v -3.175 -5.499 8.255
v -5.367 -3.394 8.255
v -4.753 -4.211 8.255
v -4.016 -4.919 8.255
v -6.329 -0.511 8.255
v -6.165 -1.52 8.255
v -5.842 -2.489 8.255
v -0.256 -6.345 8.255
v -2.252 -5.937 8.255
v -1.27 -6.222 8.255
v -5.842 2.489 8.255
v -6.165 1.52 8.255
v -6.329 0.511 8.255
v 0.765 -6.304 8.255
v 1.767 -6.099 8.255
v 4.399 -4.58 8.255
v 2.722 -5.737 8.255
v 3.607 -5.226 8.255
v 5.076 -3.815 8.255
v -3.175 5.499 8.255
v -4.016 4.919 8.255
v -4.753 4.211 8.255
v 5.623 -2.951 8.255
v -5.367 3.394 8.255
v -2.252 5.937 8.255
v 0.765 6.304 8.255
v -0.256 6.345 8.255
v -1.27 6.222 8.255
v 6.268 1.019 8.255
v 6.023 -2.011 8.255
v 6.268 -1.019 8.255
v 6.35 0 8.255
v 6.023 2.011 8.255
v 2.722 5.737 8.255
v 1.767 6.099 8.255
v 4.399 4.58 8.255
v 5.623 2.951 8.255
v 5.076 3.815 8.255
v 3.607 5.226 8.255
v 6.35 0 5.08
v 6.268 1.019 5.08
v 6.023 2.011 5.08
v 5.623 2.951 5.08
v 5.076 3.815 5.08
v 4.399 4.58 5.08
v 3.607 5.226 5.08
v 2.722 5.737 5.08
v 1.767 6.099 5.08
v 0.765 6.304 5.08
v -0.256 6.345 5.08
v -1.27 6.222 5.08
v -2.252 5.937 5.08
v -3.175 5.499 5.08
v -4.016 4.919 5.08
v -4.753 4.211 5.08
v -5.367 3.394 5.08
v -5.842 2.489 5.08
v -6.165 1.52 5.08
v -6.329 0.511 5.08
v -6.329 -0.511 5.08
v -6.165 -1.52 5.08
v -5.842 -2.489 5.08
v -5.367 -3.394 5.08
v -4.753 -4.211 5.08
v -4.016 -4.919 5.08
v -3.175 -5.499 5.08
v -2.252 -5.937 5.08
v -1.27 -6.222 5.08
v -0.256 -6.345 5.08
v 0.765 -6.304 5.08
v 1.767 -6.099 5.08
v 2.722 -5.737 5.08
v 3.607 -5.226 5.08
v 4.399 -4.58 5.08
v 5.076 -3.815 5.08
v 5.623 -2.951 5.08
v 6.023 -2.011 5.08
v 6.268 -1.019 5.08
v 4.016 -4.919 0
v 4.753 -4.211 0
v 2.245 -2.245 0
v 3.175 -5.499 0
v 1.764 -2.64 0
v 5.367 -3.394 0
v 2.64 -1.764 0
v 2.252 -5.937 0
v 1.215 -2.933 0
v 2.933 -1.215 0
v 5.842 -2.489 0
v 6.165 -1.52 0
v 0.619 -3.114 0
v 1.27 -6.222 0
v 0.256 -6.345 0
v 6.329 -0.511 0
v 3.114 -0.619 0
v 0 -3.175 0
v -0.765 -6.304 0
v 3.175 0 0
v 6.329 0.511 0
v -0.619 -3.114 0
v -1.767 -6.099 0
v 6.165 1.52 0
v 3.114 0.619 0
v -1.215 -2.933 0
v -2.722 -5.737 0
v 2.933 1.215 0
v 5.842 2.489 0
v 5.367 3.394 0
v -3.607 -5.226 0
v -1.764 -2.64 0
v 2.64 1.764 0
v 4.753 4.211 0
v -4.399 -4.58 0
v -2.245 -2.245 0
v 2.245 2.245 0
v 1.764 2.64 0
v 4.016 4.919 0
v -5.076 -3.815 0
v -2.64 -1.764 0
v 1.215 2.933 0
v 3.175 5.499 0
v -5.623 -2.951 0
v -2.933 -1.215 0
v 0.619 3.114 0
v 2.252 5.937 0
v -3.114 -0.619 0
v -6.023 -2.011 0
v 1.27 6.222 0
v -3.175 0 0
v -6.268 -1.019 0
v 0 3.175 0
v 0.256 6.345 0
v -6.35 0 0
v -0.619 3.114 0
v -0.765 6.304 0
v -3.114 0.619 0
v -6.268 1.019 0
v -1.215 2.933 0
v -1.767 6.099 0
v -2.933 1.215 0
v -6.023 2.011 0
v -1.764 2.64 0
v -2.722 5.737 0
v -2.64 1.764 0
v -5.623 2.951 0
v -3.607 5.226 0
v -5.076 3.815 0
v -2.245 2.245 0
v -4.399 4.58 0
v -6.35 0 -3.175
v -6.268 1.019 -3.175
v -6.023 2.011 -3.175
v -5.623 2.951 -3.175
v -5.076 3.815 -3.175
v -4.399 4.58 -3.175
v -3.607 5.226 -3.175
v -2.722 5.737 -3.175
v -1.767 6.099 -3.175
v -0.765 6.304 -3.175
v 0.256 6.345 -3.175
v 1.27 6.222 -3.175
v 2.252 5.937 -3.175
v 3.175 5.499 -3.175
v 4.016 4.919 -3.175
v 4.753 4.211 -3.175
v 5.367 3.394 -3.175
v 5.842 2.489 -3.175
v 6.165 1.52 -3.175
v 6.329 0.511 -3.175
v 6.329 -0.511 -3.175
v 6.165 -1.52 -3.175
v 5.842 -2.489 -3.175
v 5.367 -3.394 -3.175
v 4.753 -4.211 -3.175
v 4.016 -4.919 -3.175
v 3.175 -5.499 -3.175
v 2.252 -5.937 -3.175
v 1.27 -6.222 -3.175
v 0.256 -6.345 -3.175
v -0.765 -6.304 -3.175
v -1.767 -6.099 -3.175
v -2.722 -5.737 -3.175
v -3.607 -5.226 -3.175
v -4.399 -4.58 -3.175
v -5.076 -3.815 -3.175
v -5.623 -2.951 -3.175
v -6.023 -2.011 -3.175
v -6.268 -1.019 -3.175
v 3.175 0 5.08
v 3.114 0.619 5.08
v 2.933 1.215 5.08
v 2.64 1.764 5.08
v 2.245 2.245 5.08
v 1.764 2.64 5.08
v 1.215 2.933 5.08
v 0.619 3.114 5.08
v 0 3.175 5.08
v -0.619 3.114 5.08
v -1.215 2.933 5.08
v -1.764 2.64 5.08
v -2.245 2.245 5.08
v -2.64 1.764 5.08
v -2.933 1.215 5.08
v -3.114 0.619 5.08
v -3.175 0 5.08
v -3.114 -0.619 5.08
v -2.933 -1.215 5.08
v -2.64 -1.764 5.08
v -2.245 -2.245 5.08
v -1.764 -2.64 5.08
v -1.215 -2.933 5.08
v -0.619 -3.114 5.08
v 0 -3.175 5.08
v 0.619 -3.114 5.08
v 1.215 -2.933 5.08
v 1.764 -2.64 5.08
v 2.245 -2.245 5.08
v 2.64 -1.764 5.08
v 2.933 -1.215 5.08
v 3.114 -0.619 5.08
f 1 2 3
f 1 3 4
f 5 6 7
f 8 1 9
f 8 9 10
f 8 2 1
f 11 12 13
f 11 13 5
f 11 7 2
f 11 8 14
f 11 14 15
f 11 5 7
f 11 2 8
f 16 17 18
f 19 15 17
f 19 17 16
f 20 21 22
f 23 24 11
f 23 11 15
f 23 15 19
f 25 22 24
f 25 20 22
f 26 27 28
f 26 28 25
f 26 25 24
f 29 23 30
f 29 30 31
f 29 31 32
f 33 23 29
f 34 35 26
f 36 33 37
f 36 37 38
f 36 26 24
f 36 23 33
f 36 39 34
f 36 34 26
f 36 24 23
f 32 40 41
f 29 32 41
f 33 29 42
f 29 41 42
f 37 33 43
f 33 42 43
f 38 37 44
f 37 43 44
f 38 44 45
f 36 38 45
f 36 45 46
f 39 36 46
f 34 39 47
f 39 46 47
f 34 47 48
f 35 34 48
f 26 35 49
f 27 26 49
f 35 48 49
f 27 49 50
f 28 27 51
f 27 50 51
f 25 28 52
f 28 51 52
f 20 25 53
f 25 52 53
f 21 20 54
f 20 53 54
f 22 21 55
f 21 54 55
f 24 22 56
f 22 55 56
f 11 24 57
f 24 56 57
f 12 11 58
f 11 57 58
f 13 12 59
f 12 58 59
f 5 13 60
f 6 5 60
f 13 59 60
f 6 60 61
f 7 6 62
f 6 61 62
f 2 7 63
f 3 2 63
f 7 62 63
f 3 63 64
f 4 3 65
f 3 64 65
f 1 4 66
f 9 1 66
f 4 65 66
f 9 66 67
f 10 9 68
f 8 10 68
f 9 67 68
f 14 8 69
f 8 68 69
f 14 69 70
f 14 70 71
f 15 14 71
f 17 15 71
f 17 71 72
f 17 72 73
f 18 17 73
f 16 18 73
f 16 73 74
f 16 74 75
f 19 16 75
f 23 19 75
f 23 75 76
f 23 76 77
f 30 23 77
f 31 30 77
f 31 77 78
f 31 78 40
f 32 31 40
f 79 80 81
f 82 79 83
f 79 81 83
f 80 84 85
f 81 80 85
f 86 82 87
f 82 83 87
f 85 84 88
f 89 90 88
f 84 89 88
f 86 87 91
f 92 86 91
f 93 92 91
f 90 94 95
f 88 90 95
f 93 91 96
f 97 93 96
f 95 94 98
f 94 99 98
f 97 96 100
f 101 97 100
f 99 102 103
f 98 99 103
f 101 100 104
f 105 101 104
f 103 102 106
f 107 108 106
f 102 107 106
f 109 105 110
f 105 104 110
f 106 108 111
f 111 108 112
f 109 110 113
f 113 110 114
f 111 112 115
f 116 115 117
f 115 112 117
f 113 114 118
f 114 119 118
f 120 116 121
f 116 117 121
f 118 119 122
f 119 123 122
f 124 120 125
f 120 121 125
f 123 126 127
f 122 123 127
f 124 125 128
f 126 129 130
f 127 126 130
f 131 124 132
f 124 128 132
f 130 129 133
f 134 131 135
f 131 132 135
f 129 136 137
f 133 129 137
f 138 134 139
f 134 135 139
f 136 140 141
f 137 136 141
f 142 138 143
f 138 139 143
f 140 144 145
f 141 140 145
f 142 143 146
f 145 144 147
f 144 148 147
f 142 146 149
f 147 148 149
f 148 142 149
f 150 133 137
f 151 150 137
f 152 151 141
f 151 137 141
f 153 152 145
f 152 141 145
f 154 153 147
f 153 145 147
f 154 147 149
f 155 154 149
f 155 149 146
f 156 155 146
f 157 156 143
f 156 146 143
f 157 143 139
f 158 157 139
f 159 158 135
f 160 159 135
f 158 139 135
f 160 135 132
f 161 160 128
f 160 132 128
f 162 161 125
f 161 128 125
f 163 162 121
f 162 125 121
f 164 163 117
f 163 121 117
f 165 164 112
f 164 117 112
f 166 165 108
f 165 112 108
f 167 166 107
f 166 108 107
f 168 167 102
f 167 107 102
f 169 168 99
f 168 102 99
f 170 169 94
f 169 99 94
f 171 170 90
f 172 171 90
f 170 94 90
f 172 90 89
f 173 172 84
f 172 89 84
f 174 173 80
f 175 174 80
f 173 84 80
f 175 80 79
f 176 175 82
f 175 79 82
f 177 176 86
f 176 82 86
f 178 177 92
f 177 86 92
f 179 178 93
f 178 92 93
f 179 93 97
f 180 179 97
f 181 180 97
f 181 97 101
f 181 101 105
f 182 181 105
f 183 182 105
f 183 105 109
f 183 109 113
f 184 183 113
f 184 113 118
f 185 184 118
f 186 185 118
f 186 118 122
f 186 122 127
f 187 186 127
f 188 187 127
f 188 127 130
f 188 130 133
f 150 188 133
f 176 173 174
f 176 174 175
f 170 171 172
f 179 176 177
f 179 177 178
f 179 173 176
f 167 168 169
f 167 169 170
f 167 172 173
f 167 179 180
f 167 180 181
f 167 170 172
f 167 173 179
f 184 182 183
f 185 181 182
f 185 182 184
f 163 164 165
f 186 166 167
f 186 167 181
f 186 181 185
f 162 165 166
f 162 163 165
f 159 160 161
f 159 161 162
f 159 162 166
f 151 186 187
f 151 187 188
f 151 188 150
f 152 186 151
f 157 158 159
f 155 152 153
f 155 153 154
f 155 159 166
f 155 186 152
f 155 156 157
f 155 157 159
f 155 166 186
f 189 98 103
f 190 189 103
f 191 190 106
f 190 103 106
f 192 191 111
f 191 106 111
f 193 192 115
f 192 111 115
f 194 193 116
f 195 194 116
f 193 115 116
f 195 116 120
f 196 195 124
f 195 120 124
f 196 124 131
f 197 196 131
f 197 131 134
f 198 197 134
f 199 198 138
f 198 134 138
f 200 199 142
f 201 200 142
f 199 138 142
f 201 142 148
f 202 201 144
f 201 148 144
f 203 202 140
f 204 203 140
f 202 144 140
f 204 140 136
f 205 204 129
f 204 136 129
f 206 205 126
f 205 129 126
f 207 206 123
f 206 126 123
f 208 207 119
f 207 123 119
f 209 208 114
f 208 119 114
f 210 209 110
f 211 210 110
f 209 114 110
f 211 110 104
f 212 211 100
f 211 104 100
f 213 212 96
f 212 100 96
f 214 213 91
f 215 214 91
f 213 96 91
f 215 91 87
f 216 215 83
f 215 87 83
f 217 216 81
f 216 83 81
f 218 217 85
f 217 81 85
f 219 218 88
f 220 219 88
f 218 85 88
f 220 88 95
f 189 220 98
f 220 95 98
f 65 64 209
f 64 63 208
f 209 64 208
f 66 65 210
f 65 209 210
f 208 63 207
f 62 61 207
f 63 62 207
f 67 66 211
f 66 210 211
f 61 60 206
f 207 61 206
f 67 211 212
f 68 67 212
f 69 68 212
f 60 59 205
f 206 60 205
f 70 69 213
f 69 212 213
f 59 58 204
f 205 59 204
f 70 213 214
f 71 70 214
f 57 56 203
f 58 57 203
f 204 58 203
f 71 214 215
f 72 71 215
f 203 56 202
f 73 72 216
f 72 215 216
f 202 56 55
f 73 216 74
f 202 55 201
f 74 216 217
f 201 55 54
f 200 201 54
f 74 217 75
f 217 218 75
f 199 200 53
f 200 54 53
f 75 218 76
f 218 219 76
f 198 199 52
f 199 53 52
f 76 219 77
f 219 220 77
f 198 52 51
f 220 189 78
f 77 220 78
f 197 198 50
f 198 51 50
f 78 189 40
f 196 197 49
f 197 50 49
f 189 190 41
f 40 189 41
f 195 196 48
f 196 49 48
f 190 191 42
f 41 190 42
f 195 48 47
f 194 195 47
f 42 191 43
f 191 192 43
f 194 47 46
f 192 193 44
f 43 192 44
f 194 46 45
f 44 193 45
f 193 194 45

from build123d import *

# Parameters (mm, degrees)
SKETCH1_R           = 3.175
BOSS_EXTRUDE1_DEPTH = 5.08
SKETCH2_R           = 6.35
BOSS_EXTRUDE2_DEPTH = 3.175
SKETCH3_R           = 6.35
BOSS_EXTRUDE3_DEPTH = 3.175


with BuildPart() as part:
    # Sketch1 → Boss-Extrude1 (new body)
    with BuildSketch(Plane.XY):
        Circle(SKETCH1_R)
    extrude(amount=BOSS_EXTRUDE1_DEPTH)

    # Sketch2 → Boss-Extrude2 (add)
    with BuildSketch(Plane(origin=(0, 0, 0), x_dir=(-1, 0, 0), z_dir=(0, 0, -1))):
        Circle(SKETCH2_R)
    extrude(amount=BOSS_EXTRUDE2_DEPTH)

    # Sketch3 → Boss-Extrude3 (add)
    with BuildSketch(Plane.XY.offset(5.08)):
        Circle(SKETCH3_R)
    extrude(amount=BOSS_EXTRUDE3_DEPTH)


solid = part.part
